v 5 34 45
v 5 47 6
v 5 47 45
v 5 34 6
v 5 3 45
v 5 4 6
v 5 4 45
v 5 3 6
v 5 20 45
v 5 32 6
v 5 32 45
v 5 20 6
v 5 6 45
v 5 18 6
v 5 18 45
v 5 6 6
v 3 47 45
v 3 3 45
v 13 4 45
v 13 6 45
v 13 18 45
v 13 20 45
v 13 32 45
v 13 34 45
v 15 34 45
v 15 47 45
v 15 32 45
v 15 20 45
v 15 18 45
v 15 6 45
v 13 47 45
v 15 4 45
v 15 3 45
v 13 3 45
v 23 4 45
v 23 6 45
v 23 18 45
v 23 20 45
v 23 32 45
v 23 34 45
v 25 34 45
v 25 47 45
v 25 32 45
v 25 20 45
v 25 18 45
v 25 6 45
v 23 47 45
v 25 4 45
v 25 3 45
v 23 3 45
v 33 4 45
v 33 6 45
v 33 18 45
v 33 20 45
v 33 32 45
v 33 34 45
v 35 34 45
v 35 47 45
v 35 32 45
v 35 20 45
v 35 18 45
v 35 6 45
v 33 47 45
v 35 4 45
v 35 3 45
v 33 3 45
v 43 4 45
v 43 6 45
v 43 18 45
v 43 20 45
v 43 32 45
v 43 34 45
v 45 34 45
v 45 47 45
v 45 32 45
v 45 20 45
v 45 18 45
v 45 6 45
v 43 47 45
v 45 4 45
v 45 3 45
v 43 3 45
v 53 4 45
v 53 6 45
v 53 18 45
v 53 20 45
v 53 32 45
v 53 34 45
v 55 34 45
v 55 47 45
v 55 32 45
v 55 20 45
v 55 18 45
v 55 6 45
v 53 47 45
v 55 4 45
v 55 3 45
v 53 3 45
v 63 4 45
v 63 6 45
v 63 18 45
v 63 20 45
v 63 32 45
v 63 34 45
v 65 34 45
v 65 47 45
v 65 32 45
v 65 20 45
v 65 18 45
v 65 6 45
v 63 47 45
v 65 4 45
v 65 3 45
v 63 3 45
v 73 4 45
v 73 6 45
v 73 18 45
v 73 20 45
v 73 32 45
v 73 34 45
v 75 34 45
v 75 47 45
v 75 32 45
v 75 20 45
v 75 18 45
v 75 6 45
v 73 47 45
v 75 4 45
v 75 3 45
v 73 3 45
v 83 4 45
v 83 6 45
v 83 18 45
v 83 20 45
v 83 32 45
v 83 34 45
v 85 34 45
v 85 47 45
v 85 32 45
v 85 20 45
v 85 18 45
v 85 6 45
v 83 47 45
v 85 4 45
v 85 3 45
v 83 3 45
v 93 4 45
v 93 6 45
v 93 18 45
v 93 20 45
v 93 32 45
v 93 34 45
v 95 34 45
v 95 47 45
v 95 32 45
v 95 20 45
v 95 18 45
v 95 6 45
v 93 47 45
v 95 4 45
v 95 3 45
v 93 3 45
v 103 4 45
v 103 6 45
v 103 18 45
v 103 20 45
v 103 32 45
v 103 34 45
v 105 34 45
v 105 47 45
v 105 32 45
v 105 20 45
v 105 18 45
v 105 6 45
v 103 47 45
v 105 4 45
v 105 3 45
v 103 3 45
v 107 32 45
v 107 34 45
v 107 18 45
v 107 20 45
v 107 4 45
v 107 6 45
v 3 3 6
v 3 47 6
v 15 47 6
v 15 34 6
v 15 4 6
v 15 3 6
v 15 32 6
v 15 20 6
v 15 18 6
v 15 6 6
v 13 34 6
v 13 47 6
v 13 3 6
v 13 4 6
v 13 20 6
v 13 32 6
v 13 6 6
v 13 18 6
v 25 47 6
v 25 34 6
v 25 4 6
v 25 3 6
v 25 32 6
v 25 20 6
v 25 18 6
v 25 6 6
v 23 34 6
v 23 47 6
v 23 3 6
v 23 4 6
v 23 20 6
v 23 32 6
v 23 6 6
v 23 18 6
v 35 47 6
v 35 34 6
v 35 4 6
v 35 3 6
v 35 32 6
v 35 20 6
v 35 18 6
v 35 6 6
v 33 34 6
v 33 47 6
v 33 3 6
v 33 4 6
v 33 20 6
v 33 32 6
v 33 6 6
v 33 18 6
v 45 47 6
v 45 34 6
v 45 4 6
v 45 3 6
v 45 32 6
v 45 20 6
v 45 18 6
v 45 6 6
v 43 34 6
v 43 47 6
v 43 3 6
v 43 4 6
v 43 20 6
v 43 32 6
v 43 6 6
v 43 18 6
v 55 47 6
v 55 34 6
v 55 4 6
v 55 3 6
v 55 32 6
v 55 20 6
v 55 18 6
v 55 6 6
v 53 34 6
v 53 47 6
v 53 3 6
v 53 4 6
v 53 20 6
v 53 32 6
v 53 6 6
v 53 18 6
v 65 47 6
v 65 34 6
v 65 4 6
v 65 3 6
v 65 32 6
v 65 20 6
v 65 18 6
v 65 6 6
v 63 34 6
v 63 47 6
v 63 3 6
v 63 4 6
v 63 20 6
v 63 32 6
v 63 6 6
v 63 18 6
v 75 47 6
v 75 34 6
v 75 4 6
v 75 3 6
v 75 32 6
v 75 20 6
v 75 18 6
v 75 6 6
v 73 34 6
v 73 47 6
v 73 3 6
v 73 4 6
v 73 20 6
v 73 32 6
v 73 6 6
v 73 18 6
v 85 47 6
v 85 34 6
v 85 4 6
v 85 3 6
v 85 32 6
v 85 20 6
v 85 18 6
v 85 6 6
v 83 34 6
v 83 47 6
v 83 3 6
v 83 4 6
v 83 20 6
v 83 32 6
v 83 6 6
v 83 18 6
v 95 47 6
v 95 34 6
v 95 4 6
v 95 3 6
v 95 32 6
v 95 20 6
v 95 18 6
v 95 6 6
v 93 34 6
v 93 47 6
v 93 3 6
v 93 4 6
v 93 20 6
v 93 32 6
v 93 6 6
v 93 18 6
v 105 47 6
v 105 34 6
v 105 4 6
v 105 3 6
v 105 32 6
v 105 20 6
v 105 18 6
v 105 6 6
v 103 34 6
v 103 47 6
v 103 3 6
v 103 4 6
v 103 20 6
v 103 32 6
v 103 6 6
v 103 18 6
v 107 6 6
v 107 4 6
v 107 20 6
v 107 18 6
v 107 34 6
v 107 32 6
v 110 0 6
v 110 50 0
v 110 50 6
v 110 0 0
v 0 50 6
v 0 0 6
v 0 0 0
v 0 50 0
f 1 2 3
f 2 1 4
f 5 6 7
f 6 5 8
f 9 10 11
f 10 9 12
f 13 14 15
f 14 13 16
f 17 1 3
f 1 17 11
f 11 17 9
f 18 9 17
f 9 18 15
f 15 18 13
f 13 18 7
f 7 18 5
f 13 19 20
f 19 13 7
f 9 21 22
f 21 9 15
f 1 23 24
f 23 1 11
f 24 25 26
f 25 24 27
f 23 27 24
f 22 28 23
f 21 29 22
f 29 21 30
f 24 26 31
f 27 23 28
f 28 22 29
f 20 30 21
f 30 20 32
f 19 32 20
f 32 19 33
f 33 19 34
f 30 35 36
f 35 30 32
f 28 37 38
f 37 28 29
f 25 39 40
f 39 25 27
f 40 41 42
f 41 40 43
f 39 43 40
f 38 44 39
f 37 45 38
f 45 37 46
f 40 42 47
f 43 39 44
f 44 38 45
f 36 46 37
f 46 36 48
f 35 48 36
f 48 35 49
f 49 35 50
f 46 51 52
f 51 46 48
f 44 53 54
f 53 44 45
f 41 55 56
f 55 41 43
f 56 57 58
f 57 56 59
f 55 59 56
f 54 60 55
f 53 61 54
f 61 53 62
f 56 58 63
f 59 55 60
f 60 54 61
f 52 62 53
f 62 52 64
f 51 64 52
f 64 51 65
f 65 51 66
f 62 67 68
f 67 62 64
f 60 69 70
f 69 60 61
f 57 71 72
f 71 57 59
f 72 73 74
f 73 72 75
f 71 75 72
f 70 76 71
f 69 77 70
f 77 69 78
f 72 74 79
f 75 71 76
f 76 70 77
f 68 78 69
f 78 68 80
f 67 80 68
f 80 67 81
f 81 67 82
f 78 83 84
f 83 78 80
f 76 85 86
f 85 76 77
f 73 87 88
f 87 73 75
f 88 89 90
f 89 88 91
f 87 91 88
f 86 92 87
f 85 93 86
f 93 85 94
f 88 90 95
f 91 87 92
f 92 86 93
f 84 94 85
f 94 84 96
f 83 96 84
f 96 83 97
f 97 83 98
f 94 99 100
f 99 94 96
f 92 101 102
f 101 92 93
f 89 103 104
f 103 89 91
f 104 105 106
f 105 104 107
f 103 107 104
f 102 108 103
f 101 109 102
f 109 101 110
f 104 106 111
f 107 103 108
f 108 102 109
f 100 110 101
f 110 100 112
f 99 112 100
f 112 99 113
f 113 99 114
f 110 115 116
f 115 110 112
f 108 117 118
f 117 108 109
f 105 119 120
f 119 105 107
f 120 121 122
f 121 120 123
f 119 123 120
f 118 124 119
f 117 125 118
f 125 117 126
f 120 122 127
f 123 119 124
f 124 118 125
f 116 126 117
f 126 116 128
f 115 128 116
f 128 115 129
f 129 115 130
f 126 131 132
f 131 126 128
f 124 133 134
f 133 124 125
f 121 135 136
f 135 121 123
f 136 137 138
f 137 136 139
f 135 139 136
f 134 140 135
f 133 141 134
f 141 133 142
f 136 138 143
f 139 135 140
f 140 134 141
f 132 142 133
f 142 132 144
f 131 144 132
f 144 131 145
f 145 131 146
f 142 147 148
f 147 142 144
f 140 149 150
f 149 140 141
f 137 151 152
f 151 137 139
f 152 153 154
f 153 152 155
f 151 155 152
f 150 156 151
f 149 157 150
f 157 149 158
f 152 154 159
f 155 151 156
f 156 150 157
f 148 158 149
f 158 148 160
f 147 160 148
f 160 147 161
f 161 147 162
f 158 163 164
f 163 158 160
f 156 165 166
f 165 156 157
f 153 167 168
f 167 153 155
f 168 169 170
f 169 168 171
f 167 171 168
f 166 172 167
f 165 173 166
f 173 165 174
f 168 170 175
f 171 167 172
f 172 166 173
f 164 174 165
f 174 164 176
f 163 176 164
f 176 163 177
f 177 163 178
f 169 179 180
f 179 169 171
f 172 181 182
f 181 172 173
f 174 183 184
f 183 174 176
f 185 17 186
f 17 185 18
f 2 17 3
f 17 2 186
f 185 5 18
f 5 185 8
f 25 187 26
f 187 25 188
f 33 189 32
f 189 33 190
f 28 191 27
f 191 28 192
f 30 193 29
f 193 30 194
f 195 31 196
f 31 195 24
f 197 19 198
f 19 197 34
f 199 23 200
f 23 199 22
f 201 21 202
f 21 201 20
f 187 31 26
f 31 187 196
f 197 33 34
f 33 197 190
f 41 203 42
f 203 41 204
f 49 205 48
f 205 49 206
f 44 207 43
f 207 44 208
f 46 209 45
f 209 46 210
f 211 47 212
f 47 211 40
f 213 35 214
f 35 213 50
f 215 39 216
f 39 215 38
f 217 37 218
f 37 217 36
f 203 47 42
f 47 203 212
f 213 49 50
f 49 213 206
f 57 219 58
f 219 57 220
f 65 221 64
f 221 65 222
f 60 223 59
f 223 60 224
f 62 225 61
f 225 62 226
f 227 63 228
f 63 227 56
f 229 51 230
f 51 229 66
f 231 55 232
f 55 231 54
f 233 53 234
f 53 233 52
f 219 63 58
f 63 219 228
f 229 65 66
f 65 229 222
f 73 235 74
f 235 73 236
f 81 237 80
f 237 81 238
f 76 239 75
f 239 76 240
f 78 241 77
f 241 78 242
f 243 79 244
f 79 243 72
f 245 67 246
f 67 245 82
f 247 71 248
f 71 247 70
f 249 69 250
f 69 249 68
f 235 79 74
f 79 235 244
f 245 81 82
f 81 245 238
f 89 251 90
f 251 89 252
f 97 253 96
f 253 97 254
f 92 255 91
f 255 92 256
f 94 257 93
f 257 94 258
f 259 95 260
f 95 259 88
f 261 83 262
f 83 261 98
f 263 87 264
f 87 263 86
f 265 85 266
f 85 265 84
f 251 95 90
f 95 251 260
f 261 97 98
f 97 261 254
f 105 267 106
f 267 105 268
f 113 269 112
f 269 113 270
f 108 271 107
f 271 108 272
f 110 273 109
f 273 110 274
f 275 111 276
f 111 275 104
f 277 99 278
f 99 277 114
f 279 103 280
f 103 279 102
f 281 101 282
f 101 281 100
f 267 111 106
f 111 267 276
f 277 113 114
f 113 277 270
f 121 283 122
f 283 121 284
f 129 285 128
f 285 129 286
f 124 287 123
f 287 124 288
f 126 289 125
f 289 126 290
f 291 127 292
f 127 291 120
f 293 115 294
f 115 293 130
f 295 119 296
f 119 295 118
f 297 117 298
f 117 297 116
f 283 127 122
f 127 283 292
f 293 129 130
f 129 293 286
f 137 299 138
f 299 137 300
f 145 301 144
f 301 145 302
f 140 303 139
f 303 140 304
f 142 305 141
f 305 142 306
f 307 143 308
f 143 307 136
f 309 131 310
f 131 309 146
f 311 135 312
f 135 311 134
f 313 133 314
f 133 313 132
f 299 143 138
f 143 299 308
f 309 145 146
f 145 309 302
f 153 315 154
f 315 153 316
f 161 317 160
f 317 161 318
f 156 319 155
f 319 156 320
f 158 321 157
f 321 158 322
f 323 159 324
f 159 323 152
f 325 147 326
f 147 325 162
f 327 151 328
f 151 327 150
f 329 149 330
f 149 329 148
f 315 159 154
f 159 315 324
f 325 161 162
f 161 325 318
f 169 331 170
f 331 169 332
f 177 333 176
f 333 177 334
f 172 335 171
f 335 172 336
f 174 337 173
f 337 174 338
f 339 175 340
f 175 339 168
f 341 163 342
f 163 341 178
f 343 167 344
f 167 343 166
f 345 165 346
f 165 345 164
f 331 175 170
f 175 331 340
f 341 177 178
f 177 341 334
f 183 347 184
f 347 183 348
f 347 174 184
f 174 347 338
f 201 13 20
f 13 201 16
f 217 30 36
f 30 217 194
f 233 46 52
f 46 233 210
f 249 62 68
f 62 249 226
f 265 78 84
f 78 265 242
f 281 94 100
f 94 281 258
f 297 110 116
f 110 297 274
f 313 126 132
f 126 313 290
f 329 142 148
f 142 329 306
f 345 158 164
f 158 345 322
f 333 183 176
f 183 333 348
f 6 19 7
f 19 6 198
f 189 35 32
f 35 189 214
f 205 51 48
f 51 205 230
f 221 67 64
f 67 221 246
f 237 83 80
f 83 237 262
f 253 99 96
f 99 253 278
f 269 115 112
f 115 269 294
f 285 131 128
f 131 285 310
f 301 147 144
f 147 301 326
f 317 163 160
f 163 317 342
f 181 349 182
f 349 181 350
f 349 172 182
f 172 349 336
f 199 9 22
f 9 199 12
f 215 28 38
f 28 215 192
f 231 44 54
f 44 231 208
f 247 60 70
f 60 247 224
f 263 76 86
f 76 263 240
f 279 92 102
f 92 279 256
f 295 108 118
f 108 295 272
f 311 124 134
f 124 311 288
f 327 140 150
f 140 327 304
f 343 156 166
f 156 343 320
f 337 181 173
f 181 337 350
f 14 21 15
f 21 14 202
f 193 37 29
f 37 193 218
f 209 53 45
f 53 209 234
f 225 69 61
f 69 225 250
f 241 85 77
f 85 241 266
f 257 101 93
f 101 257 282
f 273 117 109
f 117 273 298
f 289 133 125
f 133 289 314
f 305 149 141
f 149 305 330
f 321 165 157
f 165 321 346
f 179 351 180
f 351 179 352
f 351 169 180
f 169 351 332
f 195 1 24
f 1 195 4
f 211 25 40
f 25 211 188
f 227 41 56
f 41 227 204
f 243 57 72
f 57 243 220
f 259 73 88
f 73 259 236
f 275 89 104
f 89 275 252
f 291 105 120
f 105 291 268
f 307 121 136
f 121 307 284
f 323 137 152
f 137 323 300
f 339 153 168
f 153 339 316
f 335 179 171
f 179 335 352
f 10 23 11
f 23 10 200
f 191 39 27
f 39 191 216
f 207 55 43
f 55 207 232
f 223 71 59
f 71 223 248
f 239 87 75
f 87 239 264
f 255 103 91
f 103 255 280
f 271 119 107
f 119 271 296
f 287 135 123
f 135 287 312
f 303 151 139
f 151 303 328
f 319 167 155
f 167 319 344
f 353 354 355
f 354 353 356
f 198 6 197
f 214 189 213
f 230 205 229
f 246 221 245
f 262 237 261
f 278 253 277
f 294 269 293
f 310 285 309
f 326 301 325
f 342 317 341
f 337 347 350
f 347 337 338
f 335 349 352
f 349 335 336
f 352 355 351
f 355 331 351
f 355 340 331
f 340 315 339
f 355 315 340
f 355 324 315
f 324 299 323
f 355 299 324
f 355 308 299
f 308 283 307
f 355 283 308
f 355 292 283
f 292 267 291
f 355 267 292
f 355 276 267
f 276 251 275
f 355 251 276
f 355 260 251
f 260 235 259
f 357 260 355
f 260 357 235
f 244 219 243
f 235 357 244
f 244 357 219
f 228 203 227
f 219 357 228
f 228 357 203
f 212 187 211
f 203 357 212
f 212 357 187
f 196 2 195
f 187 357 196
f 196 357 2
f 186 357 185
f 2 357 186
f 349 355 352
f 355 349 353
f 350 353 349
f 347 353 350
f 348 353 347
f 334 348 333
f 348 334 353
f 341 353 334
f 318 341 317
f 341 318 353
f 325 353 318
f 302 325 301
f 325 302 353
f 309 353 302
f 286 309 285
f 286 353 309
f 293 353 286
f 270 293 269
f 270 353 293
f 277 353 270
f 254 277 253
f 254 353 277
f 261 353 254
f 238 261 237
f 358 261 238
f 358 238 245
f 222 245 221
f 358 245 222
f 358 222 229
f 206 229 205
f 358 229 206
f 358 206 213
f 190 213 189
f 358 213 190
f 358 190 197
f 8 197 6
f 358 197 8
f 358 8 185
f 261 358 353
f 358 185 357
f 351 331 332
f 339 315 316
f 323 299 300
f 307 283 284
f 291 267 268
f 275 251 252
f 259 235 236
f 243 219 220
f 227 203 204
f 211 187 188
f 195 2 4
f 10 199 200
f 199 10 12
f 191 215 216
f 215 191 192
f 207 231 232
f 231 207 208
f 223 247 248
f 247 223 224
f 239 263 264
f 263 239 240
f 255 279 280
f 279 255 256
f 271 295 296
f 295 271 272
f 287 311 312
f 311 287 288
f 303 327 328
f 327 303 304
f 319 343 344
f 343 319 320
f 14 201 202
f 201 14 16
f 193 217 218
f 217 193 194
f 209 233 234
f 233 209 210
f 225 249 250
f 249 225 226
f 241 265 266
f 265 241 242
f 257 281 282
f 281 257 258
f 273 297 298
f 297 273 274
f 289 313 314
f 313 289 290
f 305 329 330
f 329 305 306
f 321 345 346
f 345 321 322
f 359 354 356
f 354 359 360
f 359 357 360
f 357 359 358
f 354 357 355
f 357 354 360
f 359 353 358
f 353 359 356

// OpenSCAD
$fn = 32;

// ----------------------------------------------------------------------
// Heatsink: cross fin block
// ----------------------------------------------------------------------

// --- parameters (mm) ---
base_l = 110;             // base length, X
base_w = 50;              // base width, Y
base_t = 6;               // base plate thickness
fin_h = 40;               // fin height above the base
fin_t = 2;                // fin thickness
edge = 3;                 // margin from the base ends
pitch = 10;               // fin pitch
rib_pitch = 14;           // cross rib pitch

n_fins = floor((base_l - 2 * edge - fin_t) / pitch) + 1;  // fin count
total_h = base_t + fin_h - 1;  // overall height
n_ribs = floor((base_w - 2 * edge) / rib_pitch);  // rib count

union() {
  cube([base_l, base_w, base_t]);
  for (i = [0 : n_fins - 1])
    translate([edge + i * pitch, edge, base_t - 1])
      cube([fin_t, base_w - 2 * edge, fin_h]);
  for (i = [0 : n_ribs - 1])
    translate([edge, edge + 1 + i * rib_pitch, base_t - 1])
      cube([base_l - 2 * edge, fin_t, fin_h]);
}
